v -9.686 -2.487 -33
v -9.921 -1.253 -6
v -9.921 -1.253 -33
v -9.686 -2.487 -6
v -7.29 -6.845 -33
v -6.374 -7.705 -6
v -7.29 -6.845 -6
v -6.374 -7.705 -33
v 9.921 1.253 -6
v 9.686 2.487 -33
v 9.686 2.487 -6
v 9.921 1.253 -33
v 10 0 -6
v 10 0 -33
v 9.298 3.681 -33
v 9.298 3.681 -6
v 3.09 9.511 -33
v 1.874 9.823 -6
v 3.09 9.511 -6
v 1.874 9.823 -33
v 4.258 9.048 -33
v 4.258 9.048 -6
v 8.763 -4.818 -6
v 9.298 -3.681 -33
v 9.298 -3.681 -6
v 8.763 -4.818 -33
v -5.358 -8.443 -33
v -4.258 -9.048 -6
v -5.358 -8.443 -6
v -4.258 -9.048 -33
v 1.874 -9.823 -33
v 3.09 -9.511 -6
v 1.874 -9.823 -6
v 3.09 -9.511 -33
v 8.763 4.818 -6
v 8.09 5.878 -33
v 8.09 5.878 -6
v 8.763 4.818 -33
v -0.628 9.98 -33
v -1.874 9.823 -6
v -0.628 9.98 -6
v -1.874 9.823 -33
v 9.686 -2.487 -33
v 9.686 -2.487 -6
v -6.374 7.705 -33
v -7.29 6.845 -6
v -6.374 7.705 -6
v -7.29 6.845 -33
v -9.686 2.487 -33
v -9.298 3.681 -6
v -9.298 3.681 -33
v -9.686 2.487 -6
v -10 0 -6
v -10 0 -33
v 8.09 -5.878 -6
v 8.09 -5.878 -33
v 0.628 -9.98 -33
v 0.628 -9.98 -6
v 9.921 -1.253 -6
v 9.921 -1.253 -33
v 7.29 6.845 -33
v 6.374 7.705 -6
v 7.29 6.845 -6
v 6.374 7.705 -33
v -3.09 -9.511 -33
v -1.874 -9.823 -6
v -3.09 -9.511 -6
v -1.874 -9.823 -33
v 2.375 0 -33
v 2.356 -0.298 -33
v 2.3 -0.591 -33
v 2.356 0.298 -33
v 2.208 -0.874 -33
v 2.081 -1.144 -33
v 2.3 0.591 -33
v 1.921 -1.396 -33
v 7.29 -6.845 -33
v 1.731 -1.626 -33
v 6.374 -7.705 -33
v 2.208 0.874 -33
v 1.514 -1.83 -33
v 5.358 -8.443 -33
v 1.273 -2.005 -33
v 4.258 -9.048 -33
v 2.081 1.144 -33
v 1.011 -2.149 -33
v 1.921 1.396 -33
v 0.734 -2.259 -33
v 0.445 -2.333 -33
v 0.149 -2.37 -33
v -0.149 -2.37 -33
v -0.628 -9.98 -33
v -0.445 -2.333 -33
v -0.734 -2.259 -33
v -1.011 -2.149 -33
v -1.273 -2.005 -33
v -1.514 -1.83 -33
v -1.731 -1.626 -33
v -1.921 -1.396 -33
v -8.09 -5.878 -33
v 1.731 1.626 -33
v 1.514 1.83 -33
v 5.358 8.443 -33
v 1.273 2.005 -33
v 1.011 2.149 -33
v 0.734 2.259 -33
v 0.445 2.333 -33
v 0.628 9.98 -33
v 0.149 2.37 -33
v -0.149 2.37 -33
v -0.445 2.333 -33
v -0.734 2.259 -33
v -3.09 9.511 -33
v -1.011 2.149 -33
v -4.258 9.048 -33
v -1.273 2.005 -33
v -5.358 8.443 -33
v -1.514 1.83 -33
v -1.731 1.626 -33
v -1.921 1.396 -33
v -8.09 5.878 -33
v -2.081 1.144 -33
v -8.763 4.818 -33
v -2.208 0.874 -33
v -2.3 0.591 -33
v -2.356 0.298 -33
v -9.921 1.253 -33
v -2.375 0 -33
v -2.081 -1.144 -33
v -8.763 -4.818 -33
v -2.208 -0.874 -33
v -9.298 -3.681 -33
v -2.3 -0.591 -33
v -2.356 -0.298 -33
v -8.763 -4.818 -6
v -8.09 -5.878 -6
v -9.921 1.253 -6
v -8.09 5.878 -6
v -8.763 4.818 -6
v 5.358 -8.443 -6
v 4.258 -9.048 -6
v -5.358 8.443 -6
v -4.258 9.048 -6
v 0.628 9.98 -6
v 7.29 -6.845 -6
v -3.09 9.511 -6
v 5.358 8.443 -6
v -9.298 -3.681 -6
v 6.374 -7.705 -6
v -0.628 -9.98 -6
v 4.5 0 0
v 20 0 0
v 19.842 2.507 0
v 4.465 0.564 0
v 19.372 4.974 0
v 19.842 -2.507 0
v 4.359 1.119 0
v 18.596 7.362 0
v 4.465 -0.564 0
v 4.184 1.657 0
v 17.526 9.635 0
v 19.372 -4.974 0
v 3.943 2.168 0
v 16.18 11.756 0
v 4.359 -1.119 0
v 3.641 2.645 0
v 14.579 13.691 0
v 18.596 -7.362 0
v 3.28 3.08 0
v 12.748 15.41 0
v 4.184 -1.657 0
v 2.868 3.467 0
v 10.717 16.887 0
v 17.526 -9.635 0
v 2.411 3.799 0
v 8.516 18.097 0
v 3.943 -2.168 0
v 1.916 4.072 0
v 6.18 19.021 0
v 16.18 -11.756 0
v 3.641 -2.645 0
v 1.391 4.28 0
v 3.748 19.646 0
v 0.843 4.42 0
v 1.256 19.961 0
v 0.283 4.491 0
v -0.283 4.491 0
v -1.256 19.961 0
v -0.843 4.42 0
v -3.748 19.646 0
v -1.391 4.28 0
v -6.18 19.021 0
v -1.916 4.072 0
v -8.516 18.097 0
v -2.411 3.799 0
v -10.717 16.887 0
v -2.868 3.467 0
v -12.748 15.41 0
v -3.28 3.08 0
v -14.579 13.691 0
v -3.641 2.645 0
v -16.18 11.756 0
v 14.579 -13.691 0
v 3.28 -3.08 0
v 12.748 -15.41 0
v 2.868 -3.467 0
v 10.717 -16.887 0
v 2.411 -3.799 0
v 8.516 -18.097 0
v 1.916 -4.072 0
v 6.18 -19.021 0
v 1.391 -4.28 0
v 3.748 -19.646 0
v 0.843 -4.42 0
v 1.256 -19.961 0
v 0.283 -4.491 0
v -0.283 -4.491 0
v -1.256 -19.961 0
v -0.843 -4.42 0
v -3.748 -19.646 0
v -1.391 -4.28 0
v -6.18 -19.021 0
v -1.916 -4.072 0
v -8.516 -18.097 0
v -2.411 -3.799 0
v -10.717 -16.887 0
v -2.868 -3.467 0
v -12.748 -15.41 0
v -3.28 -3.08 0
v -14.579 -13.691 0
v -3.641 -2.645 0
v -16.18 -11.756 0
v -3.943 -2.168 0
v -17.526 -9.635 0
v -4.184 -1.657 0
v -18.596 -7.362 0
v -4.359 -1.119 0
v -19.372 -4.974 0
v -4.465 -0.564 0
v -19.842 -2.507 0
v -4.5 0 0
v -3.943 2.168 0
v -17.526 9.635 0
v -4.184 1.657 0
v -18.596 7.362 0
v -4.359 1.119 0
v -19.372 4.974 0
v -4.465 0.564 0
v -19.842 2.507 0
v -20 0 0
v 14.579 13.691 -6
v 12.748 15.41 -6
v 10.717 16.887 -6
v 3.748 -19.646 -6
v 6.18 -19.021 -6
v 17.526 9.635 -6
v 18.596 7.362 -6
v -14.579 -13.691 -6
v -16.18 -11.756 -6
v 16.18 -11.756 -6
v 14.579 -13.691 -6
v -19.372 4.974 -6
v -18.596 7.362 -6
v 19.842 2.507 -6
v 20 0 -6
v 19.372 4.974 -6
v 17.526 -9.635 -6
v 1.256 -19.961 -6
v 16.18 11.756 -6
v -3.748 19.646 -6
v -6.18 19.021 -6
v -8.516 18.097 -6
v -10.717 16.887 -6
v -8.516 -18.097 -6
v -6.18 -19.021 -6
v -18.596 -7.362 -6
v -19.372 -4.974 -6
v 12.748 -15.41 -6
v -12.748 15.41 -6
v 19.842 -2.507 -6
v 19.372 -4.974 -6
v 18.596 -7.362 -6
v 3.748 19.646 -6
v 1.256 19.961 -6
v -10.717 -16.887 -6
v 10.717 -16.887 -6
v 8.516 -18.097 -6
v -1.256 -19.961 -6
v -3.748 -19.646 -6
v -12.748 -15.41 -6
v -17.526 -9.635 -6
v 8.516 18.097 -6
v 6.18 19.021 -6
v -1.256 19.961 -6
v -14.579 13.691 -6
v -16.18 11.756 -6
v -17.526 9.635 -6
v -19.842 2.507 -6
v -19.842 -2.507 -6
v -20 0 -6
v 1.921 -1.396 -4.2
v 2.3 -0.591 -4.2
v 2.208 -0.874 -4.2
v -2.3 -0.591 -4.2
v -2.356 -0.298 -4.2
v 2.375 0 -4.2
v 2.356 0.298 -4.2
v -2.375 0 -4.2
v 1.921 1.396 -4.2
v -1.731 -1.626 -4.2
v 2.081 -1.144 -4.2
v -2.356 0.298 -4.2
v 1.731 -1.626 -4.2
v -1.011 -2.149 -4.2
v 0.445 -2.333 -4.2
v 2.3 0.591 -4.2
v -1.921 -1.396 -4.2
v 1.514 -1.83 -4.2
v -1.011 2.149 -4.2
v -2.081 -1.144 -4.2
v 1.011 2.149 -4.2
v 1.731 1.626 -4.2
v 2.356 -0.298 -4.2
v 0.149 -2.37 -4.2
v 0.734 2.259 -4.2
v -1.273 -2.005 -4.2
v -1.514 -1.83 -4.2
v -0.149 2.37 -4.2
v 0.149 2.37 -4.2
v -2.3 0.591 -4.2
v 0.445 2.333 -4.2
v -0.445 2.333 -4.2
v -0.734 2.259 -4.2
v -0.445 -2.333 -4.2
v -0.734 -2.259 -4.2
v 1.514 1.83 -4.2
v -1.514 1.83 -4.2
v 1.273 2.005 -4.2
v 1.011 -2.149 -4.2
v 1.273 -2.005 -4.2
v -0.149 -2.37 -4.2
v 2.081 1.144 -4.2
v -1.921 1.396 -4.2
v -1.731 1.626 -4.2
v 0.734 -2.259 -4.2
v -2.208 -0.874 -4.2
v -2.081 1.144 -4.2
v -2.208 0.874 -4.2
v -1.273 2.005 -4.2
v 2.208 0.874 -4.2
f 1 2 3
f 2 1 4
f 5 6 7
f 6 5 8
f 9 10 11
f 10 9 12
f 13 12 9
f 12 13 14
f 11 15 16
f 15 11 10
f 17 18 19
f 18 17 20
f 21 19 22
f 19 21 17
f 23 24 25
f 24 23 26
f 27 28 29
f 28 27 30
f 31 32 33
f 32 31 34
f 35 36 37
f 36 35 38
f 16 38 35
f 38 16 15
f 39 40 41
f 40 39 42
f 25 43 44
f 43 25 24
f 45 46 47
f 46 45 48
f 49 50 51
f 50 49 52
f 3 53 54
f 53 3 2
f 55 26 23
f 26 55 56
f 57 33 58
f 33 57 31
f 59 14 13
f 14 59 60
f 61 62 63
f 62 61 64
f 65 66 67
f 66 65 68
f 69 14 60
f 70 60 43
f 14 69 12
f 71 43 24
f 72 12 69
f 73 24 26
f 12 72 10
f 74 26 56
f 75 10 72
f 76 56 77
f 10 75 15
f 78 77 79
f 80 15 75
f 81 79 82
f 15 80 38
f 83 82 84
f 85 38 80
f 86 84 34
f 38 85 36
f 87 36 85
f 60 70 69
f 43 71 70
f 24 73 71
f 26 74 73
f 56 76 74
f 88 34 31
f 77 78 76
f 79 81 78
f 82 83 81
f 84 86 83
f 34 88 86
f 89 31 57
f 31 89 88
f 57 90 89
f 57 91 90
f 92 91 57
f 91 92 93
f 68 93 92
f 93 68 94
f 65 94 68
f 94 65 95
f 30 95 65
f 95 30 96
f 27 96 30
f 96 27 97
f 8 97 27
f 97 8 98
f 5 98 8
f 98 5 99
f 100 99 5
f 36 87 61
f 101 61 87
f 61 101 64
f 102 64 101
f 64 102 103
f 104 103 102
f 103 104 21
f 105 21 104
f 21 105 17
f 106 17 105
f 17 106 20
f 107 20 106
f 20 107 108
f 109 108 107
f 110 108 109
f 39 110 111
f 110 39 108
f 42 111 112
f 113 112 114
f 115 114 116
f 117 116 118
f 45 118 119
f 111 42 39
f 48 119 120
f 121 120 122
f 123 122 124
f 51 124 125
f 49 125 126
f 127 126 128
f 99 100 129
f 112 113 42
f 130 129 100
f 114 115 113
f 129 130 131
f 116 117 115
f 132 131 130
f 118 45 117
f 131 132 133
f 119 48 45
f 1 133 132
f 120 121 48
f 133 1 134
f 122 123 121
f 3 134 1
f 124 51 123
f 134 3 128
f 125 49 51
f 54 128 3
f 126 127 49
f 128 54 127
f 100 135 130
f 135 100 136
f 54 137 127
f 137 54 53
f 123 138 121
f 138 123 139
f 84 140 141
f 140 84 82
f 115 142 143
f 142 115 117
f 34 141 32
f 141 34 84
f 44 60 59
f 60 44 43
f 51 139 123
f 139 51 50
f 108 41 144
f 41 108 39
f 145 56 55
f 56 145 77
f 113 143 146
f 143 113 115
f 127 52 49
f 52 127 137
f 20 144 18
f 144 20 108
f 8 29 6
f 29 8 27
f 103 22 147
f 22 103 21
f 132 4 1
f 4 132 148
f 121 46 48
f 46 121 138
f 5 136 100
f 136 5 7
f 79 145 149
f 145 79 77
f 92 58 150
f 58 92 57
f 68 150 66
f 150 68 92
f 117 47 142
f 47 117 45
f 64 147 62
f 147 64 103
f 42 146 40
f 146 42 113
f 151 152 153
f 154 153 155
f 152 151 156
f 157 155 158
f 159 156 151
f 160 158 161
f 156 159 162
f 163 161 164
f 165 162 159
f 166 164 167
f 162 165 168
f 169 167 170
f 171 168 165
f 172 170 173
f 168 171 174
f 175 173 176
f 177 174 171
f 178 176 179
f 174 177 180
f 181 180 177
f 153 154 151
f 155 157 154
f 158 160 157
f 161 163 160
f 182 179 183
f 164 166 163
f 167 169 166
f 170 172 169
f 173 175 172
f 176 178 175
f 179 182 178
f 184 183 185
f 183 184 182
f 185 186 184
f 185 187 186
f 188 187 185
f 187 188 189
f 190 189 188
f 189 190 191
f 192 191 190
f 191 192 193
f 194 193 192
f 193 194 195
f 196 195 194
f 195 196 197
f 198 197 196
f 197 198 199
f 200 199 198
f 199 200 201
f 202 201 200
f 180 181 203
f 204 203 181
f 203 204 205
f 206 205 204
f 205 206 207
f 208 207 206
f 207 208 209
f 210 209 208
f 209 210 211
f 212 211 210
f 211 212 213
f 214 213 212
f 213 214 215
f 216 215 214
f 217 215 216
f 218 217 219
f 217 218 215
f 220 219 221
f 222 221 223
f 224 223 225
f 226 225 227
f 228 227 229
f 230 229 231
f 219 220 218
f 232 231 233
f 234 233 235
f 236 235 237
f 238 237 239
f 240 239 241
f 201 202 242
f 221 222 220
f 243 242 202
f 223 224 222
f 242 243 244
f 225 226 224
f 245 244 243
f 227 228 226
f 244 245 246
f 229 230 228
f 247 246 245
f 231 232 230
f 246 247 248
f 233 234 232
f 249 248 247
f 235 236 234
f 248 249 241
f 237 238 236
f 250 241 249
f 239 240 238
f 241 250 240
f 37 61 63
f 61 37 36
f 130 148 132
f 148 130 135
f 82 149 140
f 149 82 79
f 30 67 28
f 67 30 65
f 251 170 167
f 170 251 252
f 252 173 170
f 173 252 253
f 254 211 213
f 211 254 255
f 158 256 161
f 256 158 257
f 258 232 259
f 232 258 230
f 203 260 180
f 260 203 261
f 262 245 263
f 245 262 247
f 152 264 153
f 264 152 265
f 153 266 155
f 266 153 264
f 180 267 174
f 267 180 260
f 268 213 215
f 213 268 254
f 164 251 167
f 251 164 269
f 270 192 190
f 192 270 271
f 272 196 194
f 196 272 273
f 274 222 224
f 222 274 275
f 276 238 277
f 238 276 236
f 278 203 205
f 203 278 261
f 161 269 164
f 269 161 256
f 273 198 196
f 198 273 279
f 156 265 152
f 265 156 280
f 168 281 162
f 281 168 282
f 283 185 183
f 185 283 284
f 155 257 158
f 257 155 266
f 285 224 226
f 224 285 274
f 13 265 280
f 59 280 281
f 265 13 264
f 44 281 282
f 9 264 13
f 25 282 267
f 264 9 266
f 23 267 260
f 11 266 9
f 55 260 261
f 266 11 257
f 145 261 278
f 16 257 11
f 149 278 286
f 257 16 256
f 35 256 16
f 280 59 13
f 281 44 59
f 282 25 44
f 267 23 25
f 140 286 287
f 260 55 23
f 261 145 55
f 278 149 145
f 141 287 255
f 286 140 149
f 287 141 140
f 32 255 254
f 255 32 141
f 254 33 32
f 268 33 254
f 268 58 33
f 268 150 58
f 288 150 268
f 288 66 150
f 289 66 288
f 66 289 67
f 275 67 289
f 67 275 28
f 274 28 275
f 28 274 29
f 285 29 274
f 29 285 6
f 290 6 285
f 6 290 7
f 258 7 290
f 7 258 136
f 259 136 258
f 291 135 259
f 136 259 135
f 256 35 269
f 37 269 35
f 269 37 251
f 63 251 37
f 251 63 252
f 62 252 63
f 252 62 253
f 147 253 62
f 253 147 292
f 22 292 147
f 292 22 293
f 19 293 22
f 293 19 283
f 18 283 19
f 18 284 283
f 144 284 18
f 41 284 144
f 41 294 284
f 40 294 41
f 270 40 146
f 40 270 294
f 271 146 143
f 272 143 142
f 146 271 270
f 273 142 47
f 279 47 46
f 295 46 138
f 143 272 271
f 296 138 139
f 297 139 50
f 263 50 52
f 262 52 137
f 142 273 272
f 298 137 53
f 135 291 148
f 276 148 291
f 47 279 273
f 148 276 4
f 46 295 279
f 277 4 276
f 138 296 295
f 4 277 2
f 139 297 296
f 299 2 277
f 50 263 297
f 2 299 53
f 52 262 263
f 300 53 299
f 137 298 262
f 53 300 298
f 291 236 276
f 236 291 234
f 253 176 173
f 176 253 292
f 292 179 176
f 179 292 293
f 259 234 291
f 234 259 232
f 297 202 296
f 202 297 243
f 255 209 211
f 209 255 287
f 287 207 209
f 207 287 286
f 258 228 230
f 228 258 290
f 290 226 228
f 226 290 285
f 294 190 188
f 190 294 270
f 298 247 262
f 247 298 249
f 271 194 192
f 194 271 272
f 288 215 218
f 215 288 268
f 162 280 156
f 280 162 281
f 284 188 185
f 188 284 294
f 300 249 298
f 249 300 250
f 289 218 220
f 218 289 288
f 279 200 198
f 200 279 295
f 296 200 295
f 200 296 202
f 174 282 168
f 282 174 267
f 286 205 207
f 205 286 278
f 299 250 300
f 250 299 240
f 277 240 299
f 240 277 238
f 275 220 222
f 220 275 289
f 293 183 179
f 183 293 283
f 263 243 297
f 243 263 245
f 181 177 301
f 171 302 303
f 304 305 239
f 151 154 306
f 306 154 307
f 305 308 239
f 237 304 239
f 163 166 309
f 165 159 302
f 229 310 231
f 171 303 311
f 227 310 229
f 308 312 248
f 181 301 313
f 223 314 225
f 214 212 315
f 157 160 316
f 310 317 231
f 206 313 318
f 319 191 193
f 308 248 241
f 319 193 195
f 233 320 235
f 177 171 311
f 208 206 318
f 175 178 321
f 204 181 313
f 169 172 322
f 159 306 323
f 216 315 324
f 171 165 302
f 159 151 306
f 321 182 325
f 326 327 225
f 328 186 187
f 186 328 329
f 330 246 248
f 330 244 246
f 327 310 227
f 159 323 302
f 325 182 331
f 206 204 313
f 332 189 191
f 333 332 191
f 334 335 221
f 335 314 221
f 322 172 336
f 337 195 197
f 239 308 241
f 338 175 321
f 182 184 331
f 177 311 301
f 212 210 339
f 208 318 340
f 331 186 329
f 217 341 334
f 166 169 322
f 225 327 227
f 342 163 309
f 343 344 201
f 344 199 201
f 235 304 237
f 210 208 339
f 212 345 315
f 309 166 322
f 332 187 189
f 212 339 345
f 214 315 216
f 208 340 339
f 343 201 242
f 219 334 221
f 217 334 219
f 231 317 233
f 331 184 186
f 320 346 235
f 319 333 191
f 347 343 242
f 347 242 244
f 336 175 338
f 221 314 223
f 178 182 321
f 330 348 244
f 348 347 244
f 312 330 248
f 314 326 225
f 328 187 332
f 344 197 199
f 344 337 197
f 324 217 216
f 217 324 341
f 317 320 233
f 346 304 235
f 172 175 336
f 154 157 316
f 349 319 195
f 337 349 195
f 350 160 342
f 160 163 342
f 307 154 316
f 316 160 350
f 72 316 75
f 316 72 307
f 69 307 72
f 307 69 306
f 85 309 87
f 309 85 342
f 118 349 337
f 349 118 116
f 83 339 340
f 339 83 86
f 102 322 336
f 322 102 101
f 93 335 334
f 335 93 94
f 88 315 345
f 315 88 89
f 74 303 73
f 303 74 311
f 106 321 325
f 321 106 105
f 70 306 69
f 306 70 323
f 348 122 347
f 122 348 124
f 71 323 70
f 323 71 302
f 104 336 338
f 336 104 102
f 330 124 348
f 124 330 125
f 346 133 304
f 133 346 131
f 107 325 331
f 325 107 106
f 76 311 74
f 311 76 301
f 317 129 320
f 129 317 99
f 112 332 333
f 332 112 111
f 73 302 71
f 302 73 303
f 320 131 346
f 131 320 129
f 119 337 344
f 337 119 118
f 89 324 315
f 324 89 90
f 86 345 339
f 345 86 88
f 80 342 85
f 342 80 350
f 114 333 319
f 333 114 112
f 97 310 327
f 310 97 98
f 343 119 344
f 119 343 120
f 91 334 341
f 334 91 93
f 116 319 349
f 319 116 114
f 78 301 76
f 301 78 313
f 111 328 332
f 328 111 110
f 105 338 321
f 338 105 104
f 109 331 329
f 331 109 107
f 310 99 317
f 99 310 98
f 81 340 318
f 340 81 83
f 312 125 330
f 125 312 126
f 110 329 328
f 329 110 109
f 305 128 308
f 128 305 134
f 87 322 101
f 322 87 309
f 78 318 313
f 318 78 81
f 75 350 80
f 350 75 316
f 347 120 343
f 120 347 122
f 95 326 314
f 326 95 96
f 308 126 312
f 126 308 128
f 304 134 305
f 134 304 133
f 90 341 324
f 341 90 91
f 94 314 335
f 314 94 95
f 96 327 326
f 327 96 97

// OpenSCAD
$fn = 50;


difference() {
	union() {
		translate(v = [0, 0, -33.0000000000]) {
			cylinder(h = 33, r = 10.0000000000);
		}
		translate(v = [0, 0, -6.0000000000]) {
			cylinder(h = 6, r = 20.0000000000);
		}
	}
	union() {
		translate(v = [0, 0, 0]) {
			rotate(a = [0, 0, 0]) {
				difference() {
					union() {
						#translate(v = [0, 0, -33.0000000000]) {
							cylinder(h = 33, r = 2.2500000000);
						}
						#translate(v = [0, 0, -4.2000000000]) {
							cylinder(h = 4.2000000000, r1 = 2.3750000000, r2 = 4.5000000000);
						}
						#translate(v = [0, 0, -33.0000000000]) {
							cylinder(h = 33, r = 2.3750000000);
						}
						#translate(v = [0, 0, -33.0000000000]) {
							cylinder(h = 33, r = 2.2500000000);
						}
					}
					union();
				}
			}
		}
	}
}
